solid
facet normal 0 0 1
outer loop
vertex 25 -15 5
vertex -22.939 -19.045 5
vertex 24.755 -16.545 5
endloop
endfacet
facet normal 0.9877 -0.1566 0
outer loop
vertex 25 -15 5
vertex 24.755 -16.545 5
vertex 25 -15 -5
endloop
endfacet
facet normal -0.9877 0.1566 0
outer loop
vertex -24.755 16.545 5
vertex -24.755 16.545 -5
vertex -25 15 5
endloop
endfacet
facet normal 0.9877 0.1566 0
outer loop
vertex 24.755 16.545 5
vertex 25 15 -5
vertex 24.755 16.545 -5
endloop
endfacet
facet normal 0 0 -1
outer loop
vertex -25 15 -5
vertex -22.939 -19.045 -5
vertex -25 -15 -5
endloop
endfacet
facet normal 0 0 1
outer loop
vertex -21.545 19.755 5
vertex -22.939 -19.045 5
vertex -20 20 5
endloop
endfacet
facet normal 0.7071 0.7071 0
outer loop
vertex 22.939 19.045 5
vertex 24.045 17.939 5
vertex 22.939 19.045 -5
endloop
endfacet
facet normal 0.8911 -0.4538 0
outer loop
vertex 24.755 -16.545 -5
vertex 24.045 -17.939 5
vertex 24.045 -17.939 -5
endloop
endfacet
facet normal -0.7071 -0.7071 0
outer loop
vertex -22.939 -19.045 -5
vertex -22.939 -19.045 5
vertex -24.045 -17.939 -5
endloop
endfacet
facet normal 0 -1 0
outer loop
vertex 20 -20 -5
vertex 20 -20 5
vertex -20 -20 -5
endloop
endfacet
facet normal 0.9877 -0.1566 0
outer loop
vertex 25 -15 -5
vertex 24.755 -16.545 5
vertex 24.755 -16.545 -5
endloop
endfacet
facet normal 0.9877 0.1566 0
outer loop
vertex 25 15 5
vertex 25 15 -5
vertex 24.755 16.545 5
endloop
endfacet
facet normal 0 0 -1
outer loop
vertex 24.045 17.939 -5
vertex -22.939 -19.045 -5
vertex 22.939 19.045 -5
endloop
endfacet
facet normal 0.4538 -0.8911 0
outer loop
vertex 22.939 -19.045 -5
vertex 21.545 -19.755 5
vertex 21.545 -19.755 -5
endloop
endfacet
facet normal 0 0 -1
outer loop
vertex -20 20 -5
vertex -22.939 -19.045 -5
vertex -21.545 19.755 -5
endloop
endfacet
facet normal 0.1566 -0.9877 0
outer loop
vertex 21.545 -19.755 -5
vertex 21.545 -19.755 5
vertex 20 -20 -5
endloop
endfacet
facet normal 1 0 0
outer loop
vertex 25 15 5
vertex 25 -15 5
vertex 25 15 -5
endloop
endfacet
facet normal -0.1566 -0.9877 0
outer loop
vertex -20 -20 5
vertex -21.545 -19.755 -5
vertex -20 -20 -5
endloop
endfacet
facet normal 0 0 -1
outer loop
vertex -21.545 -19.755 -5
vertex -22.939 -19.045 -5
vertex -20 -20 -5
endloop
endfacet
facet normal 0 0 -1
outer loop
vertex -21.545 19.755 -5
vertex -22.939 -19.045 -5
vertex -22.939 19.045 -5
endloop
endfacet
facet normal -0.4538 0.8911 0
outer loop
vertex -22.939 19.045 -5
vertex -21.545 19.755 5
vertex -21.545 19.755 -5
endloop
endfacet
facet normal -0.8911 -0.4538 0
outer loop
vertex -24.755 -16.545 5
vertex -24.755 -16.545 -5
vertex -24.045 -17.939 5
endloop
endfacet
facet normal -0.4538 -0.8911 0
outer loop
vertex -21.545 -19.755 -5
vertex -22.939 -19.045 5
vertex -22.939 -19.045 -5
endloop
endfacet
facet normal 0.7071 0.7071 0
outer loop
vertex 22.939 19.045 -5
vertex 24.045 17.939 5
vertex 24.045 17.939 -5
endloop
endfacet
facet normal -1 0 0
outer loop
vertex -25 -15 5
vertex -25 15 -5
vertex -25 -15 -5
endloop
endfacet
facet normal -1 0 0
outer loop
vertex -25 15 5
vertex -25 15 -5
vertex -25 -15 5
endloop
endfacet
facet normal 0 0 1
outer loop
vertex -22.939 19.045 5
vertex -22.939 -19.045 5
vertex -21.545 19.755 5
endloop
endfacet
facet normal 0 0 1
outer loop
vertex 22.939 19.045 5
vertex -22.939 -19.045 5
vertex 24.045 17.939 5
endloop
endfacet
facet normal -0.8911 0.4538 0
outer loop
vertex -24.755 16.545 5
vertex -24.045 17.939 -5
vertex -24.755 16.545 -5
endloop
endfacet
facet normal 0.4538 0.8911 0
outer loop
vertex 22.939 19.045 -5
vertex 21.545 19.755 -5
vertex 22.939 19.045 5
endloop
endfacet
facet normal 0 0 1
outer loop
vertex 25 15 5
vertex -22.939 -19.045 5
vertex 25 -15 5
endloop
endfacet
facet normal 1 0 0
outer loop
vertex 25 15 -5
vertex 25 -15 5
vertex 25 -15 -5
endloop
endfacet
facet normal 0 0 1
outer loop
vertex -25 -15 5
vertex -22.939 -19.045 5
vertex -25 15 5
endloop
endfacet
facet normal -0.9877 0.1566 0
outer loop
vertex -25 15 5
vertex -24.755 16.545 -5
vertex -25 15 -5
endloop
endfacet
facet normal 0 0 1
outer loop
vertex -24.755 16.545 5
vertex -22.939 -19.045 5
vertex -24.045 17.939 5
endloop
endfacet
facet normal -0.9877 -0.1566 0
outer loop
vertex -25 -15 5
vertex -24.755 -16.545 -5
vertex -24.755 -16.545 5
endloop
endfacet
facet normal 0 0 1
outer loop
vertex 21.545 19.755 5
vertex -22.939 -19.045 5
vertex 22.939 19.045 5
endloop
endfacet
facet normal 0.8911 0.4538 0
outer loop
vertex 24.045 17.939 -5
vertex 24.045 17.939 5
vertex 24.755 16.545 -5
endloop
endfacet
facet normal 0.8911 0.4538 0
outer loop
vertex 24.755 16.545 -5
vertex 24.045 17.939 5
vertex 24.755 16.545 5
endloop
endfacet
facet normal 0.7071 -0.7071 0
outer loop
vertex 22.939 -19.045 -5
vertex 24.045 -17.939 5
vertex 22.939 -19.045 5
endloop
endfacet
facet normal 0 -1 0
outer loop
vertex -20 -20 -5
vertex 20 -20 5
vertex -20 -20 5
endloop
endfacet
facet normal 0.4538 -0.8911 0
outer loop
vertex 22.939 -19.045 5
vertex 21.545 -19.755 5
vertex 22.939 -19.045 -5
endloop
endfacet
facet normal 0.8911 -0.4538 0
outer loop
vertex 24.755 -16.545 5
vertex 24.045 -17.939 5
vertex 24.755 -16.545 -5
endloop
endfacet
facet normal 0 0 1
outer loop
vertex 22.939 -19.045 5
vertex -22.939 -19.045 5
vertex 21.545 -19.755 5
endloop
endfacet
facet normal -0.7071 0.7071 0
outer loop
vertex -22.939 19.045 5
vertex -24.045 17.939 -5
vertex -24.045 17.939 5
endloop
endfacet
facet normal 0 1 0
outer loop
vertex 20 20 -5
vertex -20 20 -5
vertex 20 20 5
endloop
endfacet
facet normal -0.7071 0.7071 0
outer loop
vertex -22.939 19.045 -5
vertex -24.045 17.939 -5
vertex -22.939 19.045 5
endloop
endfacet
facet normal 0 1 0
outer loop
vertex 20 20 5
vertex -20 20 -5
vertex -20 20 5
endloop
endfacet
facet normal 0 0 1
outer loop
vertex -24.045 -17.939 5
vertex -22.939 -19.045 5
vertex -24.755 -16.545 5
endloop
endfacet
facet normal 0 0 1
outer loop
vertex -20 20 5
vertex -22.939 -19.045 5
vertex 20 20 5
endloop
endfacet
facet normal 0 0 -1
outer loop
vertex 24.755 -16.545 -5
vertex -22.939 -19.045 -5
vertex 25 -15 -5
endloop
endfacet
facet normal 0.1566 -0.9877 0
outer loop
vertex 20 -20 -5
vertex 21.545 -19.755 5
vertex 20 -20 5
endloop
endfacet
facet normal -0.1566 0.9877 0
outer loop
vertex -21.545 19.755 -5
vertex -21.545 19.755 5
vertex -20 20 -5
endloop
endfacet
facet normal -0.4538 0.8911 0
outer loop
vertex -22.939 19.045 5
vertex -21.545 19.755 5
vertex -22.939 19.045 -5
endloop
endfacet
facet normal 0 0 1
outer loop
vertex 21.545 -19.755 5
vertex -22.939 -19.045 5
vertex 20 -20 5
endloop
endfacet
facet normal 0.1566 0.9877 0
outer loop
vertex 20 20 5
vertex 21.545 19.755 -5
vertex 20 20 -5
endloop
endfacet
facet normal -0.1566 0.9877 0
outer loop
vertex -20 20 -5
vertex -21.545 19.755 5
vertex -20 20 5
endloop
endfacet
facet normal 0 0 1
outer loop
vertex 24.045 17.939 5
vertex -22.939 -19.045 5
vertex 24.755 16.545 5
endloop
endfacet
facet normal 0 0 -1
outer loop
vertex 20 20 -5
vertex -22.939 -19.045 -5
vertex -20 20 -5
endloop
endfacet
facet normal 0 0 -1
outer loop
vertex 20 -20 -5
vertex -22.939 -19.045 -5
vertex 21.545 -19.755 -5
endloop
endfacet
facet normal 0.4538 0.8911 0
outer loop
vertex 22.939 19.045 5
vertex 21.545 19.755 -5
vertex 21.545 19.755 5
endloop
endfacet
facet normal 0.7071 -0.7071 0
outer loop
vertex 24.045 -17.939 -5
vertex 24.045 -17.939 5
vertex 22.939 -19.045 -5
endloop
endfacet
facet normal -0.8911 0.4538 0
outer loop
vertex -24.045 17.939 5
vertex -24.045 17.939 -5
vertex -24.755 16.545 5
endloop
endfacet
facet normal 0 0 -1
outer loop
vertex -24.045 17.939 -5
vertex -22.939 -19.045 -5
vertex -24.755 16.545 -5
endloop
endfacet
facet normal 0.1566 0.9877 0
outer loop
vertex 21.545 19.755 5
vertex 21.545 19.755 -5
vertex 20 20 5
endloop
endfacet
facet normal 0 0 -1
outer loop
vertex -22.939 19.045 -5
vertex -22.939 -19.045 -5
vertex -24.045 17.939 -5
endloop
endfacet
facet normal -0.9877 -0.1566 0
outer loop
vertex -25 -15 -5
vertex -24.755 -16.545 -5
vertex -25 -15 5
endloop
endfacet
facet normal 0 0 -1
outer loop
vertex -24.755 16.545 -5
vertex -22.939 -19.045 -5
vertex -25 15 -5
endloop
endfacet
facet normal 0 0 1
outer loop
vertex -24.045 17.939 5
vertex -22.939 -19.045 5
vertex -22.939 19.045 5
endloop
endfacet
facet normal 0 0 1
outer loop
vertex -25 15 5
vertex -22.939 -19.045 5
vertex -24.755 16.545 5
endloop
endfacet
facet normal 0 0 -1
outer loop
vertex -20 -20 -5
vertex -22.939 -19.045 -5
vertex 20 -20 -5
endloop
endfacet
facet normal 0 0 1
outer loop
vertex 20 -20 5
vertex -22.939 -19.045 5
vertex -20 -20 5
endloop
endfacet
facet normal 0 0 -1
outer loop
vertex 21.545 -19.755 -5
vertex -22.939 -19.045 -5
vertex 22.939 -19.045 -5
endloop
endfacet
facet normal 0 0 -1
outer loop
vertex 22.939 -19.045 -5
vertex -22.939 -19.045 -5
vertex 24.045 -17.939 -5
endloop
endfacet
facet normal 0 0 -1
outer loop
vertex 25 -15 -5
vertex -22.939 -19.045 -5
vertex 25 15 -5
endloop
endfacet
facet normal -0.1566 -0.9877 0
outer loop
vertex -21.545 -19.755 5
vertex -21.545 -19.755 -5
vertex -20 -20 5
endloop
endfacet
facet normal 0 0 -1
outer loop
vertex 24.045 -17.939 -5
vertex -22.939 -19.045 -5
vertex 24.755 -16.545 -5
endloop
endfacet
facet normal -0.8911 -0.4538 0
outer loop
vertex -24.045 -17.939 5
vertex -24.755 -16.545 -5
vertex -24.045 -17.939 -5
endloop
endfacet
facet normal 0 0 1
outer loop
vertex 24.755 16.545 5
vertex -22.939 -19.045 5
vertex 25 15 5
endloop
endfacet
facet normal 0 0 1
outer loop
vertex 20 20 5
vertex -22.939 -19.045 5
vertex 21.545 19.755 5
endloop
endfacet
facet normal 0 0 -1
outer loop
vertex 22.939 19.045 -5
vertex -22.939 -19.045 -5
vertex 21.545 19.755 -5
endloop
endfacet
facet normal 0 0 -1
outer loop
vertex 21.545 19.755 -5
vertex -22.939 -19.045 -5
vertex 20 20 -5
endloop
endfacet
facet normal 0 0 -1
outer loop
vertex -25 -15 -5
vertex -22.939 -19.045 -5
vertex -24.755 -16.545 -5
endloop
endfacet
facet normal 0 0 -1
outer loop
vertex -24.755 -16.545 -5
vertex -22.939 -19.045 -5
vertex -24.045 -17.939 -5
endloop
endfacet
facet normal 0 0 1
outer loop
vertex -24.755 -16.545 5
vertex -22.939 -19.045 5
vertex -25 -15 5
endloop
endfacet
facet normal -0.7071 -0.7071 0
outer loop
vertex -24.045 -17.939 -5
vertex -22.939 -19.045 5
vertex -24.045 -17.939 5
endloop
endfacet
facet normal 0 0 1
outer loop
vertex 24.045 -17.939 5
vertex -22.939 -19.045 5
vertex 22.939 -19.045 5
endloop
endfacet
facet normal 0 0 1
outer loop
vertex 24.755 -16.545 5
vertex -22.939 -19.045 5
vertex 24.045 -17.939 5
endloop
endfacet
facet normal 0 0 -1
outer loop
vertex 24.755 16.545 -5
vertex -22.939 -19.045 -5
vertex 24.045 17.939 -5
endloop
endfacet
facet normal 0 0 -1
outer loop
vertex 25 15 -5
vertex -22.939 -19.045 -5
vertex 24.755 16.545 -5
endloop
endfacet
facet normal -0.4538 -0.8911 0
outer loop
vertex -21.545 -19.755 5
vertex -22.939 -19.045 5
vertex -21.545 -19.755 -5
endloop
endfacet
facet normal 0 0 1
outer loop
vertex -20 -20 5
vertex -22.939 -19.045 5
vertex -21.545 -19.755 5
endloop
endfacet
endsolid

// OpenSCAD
//-- Parámetros de la caja
lx=50;  //-- Longitud eje x
ly=40;  //-- Longitud eje y
r=5;    //-- Radio del redondeo
h=10;   //-- Altura

//-- Coordenadas del cilindro del primer cuadrante
cx=lx/2-r;
cy=ly/2-r;

//-- Posición de los 4 cilindros de las esquinas
P1=[cx,cy,0];
P2=[-cx,cy,0];
P3=[-cx,-cy,0];
P4=[cx,-cy,0];

//-- Obtener el menor objeto convexo que contiene los cilindros
hull(){
    translate(P1)
        cylinder(r=r,h=h,center=true,$fn=20);
    translate(P2)
        cylinder(r=r,h=h,center=true,$fn=20);
    translate(P3)
        cylinder(r=r,h=h,center=true,$fn=20);
    translate(P4)
        cylinder(r=r,h=h,center=true,$fn=20);
}
